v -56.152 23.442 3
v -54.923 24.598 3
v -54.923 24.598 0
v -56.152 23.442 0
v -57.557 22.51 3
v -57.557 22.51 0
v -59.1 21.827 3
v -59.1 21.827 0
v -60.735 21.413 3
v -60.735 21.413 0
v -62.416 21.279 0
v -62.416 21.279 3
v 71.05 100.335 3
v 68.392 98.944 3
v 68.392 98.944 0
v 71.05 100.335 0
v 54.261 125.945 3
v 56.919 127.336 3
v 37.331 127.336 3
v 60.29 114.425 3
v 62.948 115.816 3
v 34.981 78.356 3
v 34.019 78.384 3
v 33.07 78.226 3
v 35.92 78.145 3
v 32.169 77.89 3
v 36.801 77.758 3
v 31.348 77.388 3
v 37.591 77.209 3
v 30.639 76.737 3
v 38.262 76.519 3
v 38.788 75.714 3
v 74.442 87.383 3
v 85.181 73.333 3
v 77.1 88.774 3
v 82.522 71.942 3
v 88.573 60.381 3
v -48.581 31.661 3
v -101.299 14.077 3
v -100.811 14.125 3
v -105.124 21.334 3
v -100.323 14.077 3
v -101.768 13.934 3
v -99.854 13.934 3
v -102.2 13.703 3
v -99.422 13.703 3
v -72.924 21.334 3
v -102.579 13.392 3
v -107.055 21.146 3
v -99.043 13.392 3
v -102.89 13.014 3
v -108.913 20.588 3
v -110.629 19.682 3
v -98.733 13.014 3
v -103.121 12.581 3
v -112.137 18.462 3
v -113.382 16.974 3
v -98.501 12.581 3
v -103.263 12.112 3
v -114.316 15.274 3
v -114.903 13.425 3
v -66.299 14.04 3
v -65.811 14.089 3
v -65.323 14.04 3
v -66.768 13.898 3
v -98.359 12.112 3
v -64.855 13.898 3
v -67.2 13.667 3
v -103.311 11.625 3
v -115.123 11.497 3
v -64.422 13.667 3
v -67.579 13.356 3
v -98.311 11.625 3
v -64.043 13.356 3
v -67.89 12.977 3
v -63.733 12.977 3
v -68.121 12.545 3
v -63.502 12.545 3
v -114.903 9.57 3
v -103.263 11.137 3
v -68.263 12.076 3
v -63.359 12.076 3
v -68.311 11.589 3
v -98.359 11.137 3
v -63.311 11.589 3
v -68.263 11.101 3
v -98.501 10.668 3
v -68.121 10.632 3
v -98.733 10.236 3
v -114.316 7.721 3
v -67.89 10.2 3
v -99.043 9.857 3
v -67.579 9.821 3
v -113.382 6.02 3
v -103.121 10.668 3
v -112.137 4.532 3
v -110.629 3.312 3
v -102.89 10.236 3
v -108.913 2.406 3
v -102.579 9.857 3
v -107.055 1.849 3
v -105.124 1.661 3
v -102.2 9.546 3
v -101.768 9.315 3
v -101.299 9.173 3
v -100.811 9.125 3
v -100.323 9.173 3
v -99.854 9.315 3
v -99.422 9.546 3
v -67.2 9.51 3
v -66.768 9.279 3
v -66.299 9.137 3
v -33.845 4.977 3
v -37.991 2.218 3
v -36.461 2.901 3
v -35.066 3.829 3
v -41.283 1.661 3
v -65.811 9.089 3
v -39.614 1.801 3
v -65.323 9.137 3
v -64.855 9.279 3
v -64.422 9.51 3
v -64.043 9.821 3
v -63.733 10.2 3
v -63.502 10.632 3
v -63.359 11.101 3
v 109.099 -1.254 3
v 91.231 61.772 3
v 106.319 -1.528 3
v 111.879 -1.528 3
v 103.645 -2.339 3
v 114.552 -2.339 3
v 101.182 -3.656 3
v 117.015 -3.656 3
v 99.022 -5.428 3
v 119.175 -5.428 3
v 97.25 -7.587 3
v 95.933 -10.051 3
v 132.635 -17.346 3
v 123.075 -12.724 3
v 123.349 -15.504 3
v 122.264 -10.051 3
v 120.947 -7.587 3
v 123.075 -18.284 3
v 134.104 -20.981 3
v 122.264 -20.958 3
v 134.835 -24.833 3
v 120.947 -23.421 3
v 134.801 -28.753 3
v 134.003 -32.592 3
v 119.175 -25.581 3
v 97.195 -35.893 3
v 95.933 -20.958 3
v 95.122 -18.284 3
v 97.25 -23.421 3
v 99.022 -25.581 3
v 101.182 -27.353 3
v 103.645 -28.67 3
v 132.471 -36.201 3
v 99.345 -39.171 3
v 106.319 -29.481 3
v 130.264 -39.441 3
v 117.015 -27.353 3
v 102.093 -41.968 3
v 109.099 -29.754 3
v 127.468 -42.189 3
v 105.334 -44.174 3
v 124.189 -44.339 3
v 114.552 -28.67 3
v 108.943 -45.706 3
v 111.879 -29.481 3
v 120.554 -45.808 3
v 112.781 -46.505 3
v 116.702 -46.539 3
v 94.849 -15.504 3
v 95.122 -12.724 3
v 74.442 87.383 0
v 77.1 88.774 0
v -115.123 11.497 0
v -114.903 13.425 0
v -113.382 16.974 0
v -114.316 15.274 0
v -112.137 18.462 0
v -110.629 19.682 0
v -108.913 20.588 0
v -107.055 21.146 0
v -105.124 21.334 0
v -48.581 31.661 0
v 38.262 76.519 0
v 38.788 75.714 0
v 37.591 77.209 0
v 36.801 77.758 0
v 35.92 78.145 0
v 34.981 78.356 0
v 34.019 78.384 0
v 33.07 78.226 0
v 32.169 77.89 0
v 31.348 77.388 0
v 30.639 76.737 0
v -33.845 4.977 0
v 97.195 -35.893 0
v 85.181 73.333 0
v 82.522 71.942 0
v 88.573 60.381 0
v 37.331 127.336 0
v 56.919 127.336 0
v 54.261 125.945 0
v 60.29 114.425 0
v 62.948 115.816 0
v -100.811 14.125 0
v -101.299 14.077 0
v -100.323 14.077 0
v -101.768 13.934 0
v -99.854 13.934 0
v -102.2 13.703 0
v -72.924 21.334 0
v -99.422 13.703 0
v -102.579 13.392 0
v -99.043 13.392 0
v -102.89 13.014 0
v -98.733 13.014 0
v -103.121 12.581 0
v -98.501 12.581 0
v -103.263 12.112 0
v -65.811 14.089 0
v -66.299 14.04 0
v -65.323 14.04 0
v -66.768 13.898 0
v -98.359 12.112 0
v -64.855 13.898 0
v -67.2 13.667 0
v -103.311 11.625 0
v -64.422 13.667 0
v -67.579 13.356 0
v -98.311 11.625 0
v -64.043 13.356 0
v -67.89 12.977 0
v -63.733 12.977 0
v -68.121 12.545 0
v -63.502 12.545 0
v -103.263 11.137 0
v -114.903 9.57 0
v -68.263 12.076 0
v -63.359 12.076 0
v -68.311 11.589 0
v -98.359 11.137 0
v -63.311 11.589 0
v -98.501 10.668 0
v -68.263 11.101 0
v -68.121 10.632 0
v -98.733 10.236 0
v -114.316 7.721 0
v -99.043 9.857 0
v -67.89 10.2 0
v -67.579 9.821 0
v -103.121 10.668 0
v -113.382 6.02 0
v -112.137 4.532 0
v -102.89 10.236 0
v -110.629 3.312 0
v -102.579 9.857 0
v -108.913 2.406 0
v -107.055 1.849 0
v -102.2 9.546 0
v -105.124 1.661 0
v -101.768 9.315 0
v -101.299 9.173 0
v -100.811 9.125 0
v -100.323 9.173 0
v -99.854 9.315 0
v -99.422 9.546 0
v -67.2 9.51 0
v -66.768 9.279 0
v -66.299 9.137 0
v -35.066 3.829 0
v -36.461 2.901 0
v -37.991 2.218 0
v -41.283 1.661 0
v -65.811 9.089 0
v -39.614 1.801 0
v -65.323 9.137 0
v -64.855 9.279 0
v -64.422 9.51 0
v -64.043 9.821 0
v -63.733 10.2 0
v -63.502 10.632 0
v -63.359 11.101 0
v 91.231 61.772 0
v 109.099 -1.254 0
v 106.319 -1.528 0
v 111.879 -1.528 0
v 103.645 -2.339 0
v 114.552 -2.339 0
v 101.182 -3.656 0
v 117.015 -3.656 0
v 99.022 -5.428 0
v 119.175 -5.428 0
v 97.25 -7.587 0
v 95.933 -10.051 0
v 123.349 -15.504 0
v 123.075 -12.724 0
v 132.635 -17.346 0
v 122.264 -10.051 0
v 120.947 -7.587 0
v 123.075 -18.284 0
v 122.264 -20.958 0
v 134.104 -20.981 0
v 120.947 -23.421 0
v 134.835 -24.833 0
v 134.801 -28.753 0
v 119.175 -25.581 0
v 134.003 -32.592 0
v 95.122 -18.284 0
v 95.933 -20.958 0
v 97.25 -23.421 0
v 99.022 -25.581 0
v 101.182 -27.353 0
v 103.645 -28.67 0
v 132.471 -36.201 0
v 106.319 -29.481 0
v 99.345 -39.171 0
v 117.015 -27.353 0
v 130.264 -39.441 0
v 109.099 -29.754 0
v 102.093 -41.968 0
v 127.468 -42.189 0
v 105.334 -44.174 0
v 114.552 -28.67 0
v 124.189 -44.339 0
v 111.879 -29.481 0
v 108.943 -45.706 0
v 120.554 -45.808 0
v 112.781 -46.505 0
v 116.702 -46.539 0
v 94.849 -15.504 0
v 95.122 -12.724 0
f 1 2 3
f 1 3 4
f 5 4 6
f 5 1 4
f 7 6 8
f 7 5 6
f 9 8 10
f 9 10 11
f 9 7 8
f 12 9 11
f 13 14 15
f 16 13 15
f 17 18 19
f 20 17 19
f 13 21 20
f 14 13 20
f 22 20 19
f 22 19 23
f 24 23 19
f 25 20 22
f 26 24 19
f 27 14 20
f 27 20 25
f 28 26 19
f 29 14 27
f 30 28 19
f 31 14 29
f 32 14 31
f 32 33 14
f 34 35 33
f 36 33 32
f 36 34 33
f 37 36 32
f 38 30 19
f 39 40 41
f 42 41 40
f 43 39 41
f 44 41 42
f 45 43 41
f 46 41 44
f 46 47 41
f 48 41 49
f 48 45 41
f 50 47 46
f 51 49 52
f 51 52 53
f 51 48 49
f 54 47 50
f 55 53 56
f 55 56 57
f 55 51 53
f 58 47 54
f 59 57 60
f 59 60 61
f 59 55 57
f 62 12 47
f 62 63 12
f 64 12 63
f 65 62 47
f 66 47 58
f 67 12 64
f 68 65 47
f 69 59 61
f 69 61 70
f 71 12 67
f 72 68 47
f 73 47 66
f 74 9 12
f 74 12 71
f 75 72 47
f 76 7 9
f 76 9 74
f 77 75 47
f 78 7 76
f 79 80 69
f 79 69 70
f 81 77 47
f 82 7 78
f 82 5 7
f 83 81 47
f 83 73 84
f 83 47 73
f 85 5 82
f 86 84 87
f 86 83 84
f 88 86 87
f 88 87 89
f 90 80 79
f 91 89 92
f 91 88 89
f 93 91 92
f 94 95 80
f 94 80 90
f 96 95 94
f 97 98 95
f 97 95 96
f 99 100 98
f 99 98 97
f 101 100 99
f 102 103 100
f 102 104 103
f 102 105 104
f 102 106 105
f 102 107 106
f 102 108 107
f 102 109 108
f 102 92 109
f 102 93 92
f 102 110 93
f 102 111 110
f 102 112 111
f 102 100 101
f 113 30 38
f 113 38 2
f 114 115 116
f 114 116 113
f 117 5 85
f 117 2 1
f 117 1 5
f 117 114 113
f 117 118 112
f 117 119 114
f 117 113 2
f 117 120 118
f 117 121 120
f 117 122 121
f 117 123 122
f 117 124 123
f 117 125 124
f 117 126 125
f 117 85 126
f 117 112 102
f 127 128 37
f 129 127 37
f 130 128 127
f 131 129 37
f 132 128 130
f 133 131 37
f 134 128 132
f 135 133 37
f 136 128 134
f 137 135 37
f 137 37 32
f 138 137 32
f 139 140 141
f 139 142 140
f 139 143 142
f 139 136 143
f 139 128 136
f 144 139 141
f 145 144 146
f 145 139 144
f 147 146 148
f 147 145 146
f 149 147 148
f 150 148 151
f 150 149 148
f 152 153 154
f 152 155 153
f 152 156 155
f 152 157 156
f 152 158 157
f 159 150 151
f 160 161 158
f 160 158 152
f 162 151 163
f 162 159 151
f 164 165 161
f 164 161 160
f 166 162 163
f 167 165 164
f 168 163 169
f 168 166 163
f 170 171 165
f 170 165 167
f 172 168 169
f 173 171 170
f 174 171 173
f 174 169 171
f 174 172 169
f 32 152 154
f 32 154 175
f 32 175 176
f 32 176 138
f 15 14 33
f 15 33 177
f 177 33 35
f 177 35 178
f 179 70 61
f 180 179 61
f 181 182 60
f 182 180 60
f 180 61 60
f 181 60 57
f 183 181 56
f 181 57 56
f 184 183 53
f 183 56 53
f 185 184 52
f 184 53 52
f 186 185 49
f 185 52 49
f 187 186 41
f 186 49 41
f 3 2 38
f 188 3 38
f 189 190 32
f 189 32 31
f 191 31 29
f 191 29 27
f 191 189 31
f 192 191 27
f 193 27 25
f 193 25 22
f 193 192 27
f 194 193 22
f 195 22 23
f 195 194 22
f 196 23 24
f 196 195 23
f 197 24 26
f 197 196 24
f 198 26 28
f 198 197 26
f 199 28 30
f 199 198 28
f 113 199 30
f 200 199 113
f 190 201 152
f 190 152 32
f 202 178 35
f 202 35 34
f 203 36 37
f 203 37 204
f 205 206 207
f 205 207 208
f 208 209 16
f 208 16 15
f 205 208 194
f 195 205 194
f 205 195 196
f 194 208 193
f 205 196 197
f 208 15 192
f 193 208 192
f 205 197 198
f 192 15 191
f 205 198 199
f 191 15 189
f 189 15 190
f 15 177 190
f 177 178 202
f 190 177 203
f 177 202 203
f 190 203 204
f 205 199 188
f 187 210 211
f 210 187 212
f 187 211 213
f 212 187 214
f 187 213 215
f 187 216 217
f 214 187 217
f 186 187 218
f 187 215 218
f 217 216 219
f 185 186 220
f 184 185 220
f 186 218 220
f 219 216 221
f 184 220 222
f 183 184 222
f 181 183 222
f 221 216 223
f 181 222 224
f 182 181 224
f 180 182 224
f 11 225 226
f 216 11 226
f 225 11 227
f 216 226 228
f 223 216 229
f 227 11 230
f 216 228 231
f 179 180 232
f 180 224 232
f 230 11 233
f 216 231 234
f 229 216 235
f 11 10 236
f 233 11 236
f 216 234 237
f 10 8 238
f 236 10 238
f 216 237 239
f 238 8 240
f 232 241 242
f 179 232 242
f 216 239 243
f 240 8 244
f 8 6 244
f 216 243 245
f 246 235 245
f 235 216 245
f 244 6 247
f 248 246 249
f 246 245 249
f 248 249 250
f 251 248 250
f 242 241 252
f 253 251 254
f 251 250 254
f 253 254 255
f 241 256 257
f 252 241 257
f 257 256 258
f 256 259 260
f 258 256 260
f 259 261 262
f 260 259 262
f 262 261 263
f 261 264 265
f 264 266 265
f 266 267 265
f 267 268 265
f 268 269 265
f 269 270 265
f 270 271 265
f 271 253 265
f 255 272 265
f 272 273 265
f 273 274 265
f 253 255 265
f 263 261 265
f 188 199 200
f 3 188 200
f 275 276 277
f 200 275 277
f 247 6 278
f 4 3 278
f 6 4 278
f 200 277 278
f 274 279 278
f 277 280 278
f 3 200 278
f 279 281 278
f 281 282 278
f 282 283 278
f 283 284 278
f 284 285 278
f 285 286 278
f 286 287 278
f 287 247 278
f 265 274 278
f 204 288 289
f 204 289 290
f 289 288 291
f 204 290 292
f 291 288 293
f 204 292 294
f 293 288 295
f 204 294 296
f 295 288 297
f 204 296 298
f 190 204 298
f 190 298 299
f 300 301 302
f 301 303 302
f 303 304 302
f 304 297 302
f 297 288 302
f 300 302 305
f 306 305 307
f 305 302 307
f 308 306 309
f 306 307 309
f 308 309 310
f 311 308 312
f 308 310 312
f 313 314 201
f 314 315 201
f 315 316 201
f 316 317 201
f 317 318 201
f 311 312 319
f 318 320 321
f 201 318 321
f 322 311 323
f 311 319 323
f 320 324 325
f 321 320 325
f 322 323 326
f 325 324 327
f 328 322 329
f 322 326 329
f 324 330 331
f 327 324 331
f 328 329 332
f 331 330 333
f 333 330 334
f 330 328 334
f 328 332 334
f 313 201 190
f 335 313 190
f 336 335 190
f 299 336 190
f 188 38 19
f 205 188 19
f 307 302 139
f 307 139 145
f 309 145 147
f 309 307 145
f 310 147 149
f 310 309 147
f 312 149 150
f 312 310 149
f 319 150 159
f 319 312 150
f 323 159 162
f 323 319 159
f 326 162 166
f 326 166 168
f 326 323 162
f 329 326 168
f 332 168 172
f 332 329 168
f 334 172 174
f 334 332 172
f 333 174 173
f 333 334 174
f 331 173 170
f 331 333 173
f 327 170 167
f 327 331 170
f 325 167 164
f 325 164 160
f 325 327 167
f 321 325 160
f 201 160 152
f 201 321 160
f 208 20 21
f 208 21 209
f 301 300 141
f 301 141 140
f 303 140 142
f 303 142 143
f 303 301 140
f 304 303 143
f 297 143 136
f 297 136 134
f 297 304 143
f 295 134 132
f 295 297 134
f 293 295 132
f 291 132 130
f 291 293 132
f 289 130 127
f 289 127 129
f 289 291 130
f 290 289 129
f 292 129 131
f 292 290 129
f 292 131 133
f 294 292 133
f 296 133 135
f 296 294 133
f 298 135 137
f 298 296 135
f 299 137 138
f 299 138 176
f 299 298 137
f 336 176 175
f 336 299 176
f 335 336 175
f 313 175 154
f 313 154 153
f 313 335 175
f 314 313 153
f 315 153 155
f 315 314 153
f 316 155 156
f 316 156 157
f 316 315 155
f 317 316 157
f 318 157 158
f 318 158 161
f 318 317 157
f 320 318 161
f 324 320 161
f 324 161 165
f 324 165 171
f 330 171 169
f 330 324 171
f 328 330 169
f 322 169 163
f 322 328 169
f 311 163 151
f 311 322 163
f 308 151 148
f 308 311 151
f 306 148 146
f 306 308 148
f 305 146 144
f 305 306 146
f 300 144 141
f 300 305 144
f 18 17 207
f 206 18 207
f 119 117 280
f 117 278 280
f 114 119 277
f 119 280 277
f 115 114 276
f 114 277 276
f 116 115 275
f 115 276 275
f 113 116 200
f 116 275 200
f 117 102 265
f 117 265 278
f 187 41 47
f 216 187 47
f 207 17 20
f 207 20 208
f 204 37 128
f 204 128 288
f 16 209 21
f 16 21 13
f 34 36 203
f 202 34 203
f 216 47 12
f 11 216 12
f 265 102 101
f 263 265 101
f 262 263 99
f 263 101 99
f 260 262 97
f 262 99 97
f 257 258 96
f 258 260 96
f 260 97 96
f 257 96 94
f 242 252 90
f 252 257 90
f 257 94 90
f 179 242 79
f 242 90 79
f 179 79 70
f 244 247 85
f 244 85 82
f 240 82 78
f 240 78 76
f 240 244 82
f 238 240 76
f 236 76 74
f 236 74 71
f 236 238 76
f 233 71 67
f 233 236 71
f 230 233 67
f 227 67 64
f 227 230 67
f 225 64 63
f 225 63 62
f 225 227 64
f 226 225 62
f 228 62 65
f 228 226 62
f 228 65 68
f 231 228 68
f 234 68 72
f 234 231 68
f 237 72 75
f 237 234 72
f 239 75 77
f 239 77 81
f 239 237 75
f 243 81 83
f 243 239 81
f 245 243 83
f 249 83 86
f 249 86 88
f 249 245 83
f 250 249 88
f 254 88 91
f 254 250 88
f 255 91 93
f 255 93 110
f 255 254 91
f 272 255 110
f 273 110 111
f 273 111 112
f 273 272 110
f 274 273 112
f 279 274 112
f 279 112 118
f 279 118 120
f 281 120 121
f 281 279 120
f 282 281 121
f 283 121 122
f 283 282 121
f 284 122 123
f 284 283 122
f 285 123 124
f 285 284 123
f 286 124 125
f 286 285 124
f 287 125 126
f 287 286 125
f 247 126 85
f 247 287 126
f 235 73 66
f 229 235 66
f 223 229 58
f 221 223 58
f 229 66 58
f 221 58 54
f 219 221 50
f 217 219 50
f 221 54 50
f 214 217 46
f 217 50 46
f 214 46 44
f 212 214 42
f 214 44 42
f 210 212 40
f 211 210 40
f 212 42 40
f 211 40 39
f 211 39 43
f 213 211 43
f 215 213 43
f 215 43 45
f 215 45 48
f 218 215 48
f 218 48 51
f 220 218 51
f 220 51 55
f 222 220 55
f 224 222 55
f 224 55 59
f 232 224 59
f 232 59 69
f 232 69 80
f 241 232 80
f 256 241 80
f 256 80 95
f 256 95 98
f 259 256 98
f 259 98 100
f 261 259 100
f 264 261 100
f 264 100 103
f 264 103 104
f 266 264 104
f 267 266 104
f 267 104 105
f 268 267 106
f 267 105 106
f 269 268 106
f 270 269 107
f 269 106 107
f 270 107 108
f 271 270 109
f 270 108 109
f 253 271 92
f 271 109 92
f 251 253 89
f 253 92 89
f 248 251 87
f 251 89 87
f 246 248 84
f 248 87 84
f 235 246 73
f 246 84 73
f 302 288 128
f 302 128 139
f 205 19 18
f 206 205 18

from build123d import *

# Parameters (mm, degrees)
CROQUIS1_R              = 2.5
CROQUIS1_R_2            = 14.25
SALIENTE_EXTRUIR1_DEPTH = 3
CROQUIS3_W              = 3
CROQUIS3_H              = 13.002457907
CROQUIS3_H_2            = 13.048194377
CROQUIS3_H_3            = 13.048194378
CORTAR_EXTRUIR1_DEPTH   = 3
CROQUIS4_W              = 163.675423661
CROQUIS4_H              = 10
CORTAR_EXTRUIR2_DEPTH   = 10
REDONDEO1_R             = 10
CROQUIS5_R              = 2.5
CORTAR_EXTRUIR3_DEPTH   = 10
CORTAR_EXTRUIR4_DEPTH   = 10
CORTAR_EXTRUIR5_DEPTH   = 10
REDONDEO2_R             = 10


with BuildPart() as part:
    # Croquis1 → Saliente-Extruir1 (new body)
    with BuildSketch(Plane.XY):
        with BuildLine():
            Line((-135.811178416, 31.660861846), (-65.873242367, 31.660861846))
            ThreePointArc((-65.873242367, 31.660861846), (-63.837291884, 32.094144685), (-62.154198363, 33.318899594))
            Line((-62.154198363, 33.318899594), (39.377470593, 146.306634388))
            ThreePointArc((39.377470593, 146.306634388), (43.719655801, 147.925689677), (47.526539972, 145.28304984))
            Line((47.526539972, 145.28304984), (132.635412267, -17.345525839))
            ThreePointArc((132.635412267, -17.345525839), (124.188821584, -44.339138154), (97.195209269, -35.892547471))
            Line((97.195209269, -35.892547471), (38.788084081, 75.713532162))
            ThreePointArc((38.788084081, 75.713532162), (34.981199909, 78.356171999), (30.639014702, 76.737116711))
            Line((30.639014702, 76.737116711), (-44.321252629, -6.681100406))
            ThreePointArc((-44.321252629, -6.681100406), (-46.00434615, -7.905855315), (-48.040296633, -8.339138154))
            Line((-48.040296633, -8.339138154), (-135.811178416, -8.339138154))
            ThreePointArc((-135.811178416, -8.339138154), (-155.811178416, 11.660861846), (-135.811178416, 31.660861846))
        make_face()
        with Locations((-135.811178416, 11.660861846)):
            Circle(CROQUIS1_R, mode=Mode.SUBTRACT)
        with Locations((-65.81121578, 11.5885363)):
            Circle(CROQUIS1_R, mode=Mode.SUBTRACT)
        with Locations((109.098617172, -15.504324767)):
            Circle(CROQUIS1_R_2, mode=Mode.SUBTRACT)
    extrude(amount=SALIENTE_EXTRUIR1_DEPTH)

    # Croquis3 → Cortar-Extruir1 (cut)
    with BuildSketch(Plane(origin=(96.993591322, 50.759930368, 0), x_dir=(0, 0, -1), z_dir=(0.8860050749641628, 0.46367554080169926, 0))):
        with Locations((-1.5, 79.927636726)):
            Rectangle(CROQUIS3_W, CROQUIS3_H)
        with Locations((-1.5, 49.42886568)):
            Rectangle(CROQUIS3_W, CROQUIS3_H_2)
        with Locations((-1.5, 18.952962868)):
            Rectangle(CROQUIS3_W, CROQUIS3_H_3)
    extrude(amount=-CORTAR_EXTRUIR1_DEPTH, mode=Mode.SUBTRACT)

    # Croquis4 → Cortar-Extruir2 (cut)
    with BuildSketch(Plane.XY.offset(3)):
        with Locations((-95.362453556, -3.339138154)):
            Rectangle(CROQUIS4_W, CROQUIS4_H)
    extrude(amount=-CORTAR_EXTRUIR2_DEPTH, mode=Mode.SUBTRACT)

    # Redondeo1
    redondeo1_edges = [part.edges().sort_by_distance(p)[0] for p in [
        (-153.131686492, 1.660861846, 1.5),
        (-36.825099605, 1.660861846, 1.5),
    ]]
    fillet(redondeo1_edges, radius=REDONDEO1_R)

    # Croquis5 → Cortar-Extruir3 (cut)
    with BuildSketch(Plane.XY.offset(3)):
        Polygon((-63.64412415, 31.660861846), (-72.924071867, 21.333834995), (-57.92427468, 21.255832735), (-48.581088821, 31.660861846), align=None)
        Polygon((-62.154198363, 33.318899594), (-63.64412415, 31.660861846), (-48.581088821, 31.660861846), (37.330618128, 127.336343983), (22.330618128, 127.336343983), align=None)
        with Locations((-100.811197098, 11.624699073)):
            Circle(CROQUIS5_R)
    extrude(amount=-CORTAR_EXTRUIR3_DEPTH, mode=Mode.SUBTRACT)

    # Croquis6 → Cortar-Extruir4 (cut)
    with BuildSketch(Plane.XY.offset(3)):
        Polygon((-72.924071867, 21.333834995), (-60.713701646, 34.921931069), (-169.534972591, 34.921931069), (-169.534972591, 0), (-115.124337118, 0), (-115.124337118, 21.333834995), align=None)
    extrude(amount=-CORTAR_EXTRUIR4_DEPTH, mode=Mode.SUBTRACT)

    # Croquis7 → Cortar-Extruir5 (cut)
    with BuildSketch(Plane.XY.offset(3)):
        Polygon((22.330618128, 127.336343983), (78.839367292, 127.336343983), (43.163788292, 161.798984153), align=None)
    extrude(amount=-CORTAR_EXTRUIR5_DEPTH, mode=Mode.SUBTRACT)

    # Redondeo2
    # the kernel refuses this fillet: 10 mm, written as the material it adds along each edge
    with BuildSketch(Plane(origin=(-57.92427468, 21.255832735, 3), x_dir=(0.6681211936204373, 0.744052464974885, 0), z_dir=(0, 0, -1))) as redondeo2_piece_1:
        with BuildLine():
            CenterArc((REDONDEO2_R * 0.449163221223, -REDONDEO2_R), REDONDEO2_R, 90, 48.37572531)
            Line((-REDONDEO2_R * 0.298353514379, -REDONDEO2_R * 0.335757024882), (0, 0))
            Line((0, 0), (REDONDEO2_R * 0.449163221223, 0))
        make_face()
    extrude(amount=3)
    # the kernel refuses this fillet: 10 mm, written as the material it takes off along each edge
    with BuildSketch(Plane(origin=(-115.124337118, 1.660861846, 28), x_dir=(1, 0, 0), z_dir=(0, 0, -1))) as redondeo2_2_piece_1:
        with BuildLine():
            CenterArc((REDONDEO2_R, -REDONDEO2_R), REDONDEO2_R, 90, 90)
            Line((0, -REDONDEO2_R), (0, 0))
            Line((0, 0), (REDONDEO2_R, 0))
        make_face()
    extrude(amount=53, mode=Mode.SUBTRACT)
    with BuildSketch(Plane(origin=(-115.124337118, 21.333834995, 28), x_dir=(1, 0, 0), z_dir=(0, 0, -1))) as redondeo2_2_piece_2:
        with BuildLine():
            CenterArc((REDONDEO2_R, REDONDEO2_R), REDONDEO2_R, 180, 90)
            Line((0, REDONDEO2_R), (0, 0))
            Line((0, 0), (REDONDEO2_R, 0))
        make_face()
    extrude(amount=53, mode=Mode.SUBTRACT)


solid = part.part
